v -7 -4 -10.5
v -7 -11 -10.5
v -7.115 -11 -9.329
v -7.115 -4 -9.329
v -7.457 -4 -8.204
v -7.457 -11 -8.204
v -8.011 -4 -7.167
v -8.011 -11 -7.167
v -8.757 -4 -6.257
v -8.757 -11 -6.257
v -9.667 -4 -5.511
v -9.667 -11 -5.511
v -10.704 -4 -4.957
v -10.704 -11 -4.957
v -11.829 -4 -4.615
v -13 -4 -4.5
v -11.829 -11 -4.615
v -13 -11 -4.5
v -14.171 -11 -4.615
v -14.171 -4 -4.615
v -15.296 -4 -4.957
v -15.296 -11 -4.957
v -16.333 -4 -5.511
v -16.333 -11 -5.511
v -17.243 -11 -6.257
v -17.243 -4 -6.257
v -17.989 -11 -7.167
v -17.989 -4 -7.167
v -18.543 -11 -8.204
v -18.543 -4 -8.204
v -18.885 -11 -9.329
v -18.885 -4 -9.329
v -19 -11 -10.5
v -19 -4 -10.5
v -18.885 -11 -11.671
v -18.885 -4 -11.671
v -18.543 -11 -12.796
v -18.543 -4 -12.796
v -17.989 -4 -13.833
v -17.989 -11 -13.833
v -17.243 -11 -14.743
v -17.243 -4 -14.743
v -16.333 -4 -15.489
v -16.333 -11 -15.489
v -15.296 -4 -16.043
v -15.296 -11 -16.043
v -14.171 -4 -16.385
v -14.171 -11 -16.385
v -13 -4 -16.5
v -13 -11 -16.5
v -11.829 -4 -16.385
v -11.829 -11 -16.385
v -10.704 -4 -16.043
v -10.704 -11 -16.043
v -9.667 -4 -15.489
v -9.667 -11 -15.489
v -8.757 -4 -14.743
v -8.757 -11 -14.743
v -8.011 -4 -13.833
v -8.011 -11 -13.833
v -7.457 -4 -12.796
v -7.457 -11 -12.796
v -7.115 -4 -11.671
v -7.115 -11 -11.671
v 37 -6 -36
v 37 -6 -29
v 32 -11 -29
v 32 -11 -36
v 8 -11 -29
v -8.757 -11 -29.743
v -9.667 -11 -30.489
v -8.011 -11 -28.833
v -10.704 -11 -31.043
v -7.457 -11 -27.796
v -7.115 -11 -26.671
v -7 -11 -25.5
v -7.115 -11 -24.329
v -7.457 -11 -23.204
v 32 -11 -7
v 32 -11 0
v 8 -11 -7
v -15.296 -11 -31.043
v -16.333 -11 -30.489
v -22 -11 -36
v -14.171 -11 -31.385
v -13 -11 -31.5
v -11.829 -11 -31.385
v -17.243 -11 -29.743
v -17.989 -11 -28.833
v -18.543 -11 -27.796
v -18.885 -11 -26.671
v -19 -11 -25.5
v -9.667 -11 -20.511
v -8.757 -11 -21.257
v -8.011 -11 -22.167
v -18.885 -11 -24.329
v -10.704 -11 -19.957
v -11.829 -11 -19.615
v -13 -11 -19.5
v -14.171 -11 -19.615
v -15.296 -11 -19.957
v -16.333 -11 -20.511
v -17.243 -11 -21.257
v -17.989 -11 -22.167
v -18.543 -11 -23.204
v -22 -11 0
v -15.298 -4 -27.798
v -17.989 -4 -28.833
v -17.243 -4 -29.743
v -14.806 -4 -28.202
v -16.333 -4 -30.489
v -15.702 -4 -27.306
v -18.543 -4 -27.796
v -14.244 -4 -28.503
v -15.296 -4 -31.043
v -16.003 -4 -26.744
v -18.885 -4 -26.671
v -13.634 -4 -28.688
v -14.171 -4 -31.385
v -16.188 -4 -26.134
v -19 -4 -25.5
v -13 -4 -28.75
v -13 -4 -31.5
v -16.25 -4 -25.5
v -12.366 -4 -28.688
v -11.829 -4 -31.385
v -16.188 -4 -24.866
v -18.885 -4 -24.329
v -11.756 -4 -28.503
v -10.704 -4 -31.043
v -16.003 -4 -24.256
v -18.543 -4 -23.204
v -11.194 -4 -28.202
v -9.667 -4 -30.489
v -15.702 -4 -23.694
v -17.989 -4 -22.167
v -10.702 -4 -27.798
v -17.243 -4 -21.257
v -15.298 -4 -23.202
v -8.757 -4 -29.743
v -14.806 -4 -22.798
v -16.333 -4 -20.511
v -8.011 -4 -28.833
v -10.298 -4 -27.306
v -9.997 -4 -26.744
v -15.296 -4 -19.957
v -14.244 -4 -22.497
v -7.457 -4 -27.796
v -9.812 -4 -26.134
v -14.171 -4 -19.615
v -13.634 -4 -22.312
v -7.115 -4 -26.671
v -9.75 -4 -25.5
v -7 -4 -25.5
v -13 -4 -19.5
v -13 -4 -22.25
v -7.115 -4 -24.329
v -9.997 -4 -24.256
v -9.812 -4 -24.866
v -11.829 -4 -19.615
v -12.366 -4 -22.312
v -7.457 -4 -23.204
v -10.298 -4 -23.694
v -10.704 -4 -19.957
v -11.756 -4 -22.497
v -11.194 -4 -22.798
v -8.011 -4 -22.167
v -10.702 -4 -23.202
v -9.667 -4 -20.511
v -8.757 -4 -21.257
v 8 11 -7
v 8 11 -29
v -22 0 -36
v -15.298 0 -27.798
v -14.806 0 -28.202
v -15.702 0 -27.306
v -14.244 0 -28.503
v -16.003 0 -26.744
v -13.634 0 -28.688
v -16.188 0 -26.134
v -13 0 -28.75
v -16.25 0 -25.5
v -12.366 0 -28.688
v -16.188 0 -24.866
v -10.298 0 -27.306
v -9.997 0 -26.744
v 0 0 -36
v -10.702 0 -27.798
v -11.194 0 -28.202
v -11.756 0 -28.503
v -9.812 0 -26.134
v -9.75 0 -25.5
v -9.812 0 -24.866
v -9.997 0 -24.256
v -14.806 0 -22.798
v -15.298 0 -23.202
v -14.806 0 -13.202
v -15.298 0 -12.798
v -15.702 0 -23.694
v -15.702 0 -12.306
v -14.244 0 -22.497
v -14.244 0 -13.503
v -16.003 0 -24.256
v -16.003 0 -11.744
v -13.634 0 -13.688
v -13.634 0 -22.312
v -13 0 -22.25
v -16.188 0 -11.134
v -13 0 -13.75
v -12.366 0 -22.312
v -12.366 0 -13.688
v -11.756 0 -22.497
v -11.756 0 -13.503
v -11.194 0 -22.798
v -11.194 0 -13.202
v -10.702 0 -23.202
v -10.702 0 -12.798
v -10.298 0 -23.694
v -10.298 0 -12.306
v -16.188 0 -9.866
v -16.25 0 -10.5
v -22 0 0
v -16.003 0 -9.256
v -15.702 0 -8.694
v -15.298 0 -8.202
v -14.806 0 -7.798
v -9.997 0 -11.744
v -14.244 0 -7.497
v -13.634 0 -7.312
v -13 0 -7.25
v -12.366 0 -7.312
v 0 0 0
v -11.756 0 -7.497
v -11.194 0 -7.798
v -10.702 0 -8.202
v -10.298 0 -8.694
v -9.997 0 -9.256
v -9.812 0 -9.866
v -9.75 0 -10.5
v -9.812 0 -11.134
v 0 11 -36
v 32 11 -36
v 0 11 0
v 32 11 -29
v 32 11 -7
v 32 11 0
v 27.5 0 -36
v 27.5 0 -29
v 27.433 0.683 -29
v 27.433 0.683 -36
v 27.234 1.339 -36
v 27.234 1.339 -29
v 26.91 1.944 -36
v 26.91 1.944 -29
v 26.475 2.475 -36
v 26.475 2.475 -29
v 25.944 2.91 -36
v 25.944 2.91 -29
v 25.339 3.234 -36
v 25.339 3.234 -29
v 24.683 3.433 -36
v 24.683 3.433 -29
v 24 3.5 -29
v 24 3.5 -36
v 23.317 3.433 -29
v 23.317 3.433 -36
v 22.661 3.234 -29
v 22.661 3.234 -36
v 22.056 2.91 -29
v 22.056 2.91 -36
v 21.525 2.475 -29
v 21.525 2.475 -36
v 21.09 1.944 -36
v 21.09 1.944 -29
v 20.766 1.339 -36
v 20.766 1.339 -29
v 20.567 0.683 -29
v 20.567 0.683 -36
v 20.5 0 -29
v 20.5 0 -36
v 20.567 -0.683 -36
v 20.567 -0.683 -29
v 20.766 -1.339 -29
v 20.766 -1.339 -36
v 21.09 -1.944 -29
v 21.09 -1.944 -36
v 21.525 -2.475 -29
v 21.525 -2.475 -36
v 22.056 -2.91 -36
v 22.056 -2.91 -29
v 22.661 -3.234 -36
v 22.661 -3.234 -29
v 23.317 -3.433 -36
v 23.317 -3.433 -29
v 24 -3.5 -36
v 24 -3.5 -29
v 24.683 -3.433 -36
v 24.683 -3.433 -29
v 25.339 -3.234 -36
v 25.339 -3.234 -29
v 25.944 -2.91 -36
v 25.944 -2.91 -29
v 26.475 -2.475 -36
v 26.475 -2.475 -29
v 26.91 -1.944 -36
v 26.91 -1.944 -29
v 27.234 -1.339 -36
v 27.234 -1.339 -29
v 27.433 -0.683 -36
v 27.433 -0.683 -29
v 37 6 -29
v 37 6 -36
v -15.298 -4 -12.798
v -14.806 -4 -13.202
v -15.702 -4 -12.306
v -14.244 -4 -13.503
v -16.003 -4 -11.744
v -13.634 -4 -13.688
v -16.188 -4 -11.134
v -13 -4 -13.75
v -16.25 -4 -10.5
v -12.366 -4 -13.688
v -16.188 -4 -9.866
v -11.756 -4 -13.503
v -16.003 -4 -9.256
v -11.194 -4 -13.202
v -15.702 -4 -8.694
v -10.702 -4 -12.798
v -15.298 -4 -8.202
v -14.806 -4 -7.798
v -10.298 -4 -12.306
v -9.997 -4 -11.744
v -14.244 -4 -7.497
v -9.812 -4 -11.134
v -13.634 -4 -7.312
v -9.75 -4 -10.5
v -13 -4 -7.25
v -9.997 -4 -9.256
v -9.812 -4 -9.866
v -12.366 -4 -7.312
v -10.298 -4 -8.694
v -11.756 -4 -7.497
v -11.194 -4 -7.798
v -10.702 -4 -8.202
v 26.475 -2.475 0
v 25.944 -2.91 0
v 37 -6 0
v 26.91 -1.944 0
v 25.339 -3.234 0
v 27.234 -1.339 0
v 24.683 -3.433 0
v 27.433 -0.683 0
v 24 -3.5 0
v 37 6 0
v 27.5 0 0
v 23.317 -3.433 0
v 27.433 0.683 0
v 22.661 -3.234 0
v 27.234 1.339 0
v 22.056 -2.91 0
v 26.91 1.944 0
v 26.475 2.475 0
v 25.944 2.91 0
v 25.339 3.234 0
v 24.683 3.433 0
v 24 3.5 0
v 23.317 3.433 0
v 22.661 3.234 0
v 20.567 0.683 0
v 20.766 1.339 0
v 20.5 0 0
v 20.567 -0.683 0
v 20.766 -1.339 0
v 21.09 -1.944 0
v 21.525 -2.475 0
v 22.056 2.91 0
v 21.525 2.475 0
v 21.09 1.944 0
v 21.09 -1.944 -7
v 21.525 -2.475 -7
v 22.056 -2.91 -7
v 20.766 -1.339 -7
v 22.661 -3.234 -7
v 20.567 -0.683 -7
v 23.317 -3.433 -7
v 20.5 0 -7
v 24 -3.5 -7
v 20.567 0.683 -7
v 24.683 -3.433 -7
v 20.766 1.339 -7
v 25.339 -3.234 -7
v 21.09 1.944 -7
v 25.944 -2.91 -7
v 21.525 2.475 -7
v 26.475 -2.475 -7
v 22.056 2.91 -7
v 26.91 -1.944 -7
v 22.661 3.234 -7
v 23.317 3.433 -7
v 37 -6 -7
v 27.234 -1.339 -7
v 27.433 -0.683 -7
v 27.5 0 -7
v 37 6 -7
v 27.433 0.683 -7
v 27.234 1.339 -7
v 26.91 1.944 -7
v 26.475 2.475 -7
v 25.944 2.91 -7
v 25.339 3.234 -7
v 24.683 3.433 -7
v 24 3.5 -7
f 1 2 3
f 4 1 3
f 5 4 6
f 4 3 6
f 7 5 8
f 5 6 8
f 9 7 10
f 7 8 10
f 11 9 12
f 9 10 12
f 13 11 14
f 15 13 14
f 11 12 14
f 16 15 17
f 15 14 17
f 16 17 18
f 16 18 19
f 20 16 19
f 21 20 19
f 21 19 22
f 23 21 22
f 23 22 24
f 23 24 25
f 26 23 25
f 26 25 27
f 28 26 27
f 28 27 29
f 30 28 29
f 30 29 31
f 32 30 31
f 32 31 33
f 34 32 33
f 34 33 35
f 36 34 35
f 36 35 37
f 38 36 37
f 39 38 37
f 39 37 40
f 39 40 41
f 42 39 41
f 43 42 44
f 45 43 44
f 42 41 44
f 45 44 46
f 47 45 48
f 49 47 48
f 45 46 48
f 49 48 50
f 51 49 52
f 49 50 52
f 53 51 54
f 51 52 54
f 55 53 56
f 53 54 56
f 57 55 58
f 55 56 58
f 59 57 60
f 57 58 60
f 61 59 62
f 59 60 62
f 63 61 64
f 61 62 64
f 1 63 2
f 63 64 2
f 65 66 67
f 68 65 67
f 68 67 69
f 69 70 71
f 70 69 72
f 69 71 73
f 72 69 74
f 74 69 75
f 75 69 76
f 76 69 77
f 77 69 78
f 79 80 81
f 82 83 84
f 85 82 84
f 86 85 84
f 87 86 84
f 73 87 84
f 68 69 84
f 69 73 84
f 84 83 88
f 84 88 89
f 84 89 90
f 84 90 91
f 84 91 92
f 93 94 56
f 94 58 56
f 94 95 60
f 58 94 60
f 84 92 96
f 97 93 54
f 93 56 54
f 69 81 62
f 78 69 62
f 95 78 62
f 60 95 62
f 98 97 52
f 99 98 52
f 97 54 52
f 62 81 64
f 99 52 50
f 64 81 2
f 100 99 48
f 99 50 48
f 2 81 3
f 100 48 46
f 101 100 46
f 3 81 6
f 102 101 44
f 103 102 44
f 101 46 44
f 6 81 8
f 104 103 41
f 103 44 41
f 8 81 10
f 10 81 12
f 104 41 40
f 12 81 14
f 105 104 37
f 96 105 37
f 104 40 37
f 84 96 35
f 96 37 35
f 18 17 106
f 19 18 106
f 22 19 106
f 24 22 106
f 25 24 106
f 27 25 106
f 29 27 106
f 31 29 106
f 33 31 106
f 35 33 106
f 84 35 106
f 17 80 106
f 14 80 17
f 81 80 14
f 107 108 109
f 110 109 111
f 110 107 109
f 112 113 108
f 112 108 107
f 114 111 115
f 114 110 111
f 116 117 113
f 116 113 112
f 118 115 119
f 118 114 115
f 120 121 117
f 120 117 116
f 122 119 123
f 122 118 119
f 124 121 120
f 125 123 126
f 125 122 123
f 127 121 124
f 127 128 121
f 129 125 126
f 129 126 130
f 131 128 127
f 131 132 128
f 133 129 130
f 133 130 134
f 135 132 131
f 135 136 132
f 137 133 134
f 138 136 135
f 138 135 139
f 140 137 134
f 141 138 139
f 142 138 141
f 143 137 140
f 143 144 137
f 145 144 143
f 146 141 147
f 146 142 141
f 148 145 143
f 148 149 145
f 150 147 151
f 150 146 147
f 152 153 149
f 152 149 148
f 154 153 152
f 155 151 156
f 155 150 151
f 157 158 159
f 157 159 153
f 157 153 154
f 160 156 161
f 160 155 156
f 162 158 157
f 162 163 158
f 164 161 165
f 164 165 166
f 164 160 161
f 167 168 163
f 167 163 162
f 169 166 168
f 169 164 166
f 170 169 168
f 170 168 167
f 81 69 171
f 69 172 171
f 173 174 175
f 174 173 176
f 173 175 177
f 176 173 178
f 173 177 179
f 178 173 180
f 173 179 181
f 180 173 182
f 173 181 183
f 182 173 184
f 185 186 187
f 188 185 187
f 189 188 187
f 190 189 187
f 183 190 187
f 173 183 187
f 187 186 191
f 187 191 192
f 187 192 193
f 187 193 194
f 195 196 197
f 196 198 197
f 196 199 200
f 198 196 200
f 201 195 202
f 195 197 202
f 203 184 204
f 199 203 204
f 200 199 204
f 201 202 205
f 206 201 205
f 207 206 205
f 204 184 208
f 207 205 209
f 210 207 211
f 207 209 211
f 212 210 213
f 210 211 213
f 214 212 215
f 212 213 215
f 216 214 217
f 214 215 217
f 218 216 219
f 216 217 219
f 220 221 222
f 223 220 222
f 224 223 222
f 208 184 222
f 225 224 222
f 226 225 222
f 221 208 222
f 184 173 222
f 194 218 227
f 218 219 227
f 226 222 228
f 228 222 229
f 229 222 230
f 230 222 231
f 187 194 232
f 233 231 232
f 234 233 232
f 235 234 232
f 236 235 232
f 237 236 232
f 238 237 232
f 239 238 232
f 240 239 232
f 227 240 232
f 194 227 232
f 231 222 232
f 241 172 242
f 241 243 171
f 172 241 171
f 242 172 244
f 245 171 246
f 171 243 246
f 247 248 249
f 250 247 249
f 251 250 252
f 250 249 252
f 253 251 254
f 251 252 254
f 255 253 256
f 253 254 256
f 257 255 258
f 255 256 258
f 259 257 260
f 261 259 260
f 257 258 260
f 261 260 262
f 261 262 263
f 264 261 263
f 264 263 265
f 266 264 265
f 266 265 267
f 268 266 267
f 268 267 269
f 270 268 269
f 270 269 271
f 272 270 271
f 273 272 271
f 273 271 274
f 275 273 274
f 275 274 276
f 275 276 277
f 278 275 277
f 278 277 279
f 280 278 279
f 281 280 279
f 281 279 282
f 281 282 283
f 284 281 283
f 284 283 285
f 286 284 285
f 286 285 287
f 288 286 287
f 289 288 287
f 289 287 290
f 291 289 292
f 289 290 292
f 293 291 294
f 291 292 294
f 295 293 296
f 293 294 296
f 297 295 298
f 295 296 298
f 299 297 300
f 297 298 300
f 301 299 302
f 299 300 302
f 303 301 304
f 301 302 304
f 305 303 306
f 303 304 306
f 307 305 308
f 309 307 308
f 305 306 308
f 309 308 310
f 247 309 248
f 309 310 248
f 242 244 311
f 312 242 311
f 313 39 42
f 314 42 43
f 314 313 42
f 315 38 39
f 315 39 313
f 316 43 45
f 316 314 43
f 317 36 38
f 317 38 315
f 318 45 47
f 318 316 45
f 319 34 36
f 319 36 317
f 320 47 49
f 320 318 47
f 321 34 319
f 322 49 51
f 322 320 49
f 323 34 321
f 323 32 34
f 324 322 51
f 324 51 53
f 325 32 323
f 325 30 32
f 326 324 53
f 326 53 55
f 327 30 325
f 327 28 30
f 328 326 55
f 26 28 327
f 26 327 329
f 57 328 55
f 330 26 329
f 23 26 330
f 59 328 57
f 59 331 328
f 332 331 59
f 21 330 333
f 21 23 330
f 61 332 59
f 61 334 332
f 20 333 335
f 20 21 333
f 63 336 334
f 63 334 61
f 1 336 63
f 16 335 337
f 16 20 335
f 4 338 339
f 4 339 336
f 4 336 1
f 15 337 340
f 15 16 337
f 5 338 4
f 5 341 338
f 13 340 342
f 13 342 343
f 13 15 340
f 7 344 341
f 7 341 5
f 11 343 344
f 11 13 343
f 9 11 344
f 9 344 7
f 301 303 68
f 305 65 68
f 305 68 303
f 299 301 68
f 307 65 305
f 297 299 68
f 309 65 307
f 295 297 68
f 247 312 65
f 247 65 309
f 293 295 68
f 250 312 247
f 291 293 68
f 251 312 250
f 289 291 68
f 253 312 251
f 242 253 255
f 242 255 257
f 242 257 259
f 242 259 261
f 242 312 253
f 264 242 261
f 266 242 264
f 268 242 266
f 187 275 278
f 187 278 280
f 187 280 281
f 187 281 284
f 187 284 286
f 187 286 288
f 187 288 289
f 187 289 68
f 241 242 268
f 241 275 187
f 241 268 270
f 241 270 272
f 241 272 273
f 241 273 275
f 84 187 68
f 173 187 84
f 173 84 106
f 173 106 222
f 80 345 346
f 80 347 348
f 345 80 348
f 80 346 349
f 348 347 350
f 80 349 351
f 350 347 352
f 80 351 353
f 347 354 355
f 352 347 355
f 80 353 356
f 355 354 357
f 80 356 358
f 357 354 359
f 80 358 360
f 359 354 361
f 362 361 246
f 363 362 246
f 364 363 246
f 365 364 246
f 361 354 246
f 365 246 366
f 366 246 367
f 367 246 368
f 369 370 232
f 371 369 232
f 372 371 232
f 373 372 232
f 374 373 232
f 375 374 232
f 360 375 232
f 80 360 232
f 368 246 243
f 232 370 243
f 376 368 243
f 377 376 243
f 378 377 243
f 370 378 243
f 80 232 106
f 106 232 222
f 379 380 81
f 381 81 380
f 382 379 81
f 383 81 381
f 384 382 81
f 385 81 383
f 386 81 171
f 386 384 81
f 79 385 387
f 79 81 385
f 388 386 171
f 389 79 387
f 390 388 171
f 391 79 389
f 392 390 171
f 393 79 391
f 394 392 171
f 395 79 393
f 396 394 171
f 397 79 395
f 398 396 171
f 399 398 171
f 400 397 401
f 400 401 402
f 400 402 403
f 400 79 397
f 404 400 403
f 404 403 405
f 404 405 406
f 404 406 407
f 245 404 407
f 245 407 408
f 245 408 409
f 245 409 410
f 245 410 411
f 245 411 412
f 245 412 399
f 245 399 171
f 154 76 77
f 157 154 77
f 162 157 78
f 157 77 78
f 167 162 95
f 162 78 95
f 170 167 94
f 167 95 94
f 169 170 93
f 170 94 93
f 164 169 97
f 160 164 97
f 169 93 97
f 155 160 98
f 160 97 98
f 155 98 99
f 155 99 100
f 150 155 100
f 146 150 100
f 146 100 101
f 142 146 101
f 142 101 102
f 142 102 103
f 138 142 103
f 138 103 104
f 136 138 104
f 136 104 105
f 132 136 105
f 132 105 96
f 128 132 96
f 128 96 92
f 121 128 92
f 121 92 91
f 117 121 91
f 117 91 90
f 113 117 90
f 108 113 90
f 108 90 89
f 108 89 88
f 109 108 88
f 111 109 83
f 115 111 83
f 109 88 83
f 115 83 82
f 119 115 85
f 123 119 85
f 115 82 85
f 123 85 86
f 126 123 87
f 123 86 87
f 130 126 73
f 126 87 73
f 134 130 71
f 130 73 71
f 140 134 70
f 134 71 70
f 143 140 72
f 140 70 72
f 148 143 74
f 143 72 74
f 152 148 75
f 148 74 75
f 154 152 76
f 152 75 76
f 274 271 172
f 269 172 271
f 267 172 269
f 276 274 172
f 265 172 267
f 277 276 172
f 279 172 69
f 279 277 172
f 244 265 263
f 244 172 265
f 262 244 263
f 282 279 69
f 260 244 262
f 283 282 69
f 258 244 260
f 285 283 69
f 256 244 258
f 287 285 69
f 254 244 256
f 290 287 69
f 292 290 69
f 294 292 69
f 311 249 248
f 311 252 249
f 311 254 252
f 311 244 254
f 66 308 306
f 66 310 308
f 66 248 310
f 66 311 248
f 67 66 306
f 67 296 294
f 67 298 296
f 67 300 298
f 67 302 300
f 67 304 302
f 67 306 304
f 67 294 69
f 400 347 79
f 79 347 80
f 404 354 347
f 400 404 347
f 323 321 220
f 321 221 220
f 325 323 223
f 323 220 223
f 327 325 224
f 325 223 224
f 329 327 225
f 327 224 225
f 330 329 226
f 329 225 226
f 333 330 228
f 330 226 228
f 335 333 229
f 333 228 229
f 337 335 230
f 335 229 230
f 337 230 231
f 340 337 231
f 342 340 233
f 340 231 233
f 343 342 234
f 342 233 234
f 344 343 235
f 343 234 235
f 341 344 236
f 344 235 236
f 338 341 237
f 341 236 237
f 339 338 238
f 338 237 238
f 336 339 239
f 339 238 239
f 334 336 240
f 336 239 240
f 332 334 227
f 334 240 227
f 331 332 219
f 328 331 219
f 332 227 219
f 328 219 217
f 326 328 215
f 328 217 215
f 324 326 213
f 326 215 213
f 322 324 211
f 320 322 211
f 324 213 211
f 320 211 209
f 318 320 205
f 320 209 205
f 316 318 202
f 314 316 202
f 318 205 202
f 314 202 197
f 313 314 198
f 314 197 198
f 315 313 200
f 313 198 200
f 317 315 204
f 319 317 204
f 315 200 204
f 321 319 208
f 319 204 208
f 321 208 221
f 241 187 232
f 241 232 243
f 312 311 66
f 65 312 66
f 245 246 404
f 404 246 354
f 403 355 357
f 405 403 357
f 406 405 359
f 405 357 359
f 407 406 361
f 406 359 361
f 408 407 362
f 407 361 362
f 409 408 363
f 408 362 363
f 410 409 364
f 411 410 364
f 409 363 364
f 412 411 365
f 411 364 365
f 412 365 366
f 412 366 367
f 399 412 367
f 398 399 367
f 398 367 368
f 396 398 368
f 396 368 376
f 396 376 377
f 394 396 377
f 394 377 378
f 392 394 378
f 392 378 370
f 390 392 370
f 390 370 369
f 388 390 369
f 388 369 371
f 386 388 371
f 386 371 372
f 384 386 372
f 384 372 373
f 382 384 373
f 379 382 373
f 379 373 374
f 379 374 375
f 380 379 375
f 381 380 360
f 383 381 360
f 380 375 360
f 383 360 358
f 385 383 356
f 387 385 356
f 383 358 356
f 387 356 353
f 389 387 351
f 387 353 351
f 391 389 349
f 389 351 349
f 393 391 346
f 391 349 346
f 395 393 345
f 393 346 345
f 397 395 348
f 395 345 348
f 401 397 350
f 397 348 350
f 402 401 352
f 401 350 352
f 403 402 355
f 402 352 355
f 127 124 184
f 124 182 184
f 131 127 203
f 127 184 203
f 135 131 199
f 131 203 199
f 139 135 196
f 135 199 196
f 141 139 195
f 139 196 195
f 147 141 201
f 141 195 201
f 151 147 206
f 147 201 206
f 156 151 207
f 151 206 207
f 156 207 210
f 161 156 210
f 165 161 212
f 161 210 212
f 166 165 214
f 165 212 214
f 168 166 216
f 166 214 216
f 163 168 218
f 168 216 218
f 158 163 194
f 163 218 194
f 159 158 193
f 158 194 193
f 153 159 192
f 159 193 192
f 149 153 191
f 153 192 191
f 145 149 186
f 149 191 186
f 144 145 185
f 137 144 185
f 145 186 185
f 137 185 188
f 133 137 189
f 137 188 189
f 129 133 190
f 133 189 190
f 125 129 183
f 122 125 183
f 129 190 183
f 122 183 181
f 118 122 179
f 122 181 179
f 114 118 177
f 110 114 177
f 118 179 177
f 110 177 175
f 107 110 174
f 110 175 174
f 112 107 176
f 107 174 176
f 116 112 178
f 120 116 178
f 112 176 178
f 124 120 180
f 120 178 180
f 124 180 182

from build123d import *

# Parameters (mm, degrees)
ESQUISSE1_R                                     = 3.5
BASE_EXTRUSION_DEPTH                            = 36
CHAMBRAGE_POUR_VIS_T_TE_CYLINDRIQUE_D           = 6.5
CHAMBRAGE_POUR_VIS_T_TE_CYLINDRIQUE_CBORE_D     = 12
CHAMBRAGE_POUR_VIS_T_TE_CYLINDRIQUE_CBORE_DEPTH = 7
ENL_V_MAT_EXTRU_1_DEPTH                         = 29


with BuildPart() as part:
    # Esquisse1 → Base-Extrusion (new body)
    with BuildSketch(Plane.XY):
        Polygon((0, 0), (0, 11), (32, 11), (37, 6), (37, -6), (32, -11), (-22, -11), (-22, 0), align=None)
        with Locations((24, 0)):
            Circle(ESQUISSE1_R, mode=Mode.SUBTRACT)
    extrude(amount=-BASE_EXTRUSION_DEPTH)

    # Chambrage pour vis à tête cylindrique à 6 pans creux (vis CHC) M51 (through all)
    with Locations(Plane.XZ.offset(11)):
        with Locations((-13, -25.5), (-13, -10.5)):
            CounterBoreHole(CHAMBRAGE_POUR_VIS_T_TE_CYLINDRIQUE_D / 2, CHAMBRAGE_POUR_VIS_T_TE_CYLINDRIQUE_CBORE_D / 2, CHAMBRAGE_POUR_VIS_T_TE_CYLINDRIQUE_CBORE_DEPTH)

    # Esquisse4 → Enlèv. mat.-Extru.1 (cut)
    with BuildSketch(Plane(origin=(37, 0, 0), x_dir=(0, 0, -1), z_dir=(1, 0, 0))):
        Polygon((29, -12.973294334), (18, -12.973294334), (7, -12.973294334), (7, 12.026705666), (18, 12.026705666), (29, 12.026705666), align=None)
    extrude(amount=-ENL_V_MAT_EXTRU_1_DEPTH, mode=Mode.SUBTRACT)


solid = part.part
